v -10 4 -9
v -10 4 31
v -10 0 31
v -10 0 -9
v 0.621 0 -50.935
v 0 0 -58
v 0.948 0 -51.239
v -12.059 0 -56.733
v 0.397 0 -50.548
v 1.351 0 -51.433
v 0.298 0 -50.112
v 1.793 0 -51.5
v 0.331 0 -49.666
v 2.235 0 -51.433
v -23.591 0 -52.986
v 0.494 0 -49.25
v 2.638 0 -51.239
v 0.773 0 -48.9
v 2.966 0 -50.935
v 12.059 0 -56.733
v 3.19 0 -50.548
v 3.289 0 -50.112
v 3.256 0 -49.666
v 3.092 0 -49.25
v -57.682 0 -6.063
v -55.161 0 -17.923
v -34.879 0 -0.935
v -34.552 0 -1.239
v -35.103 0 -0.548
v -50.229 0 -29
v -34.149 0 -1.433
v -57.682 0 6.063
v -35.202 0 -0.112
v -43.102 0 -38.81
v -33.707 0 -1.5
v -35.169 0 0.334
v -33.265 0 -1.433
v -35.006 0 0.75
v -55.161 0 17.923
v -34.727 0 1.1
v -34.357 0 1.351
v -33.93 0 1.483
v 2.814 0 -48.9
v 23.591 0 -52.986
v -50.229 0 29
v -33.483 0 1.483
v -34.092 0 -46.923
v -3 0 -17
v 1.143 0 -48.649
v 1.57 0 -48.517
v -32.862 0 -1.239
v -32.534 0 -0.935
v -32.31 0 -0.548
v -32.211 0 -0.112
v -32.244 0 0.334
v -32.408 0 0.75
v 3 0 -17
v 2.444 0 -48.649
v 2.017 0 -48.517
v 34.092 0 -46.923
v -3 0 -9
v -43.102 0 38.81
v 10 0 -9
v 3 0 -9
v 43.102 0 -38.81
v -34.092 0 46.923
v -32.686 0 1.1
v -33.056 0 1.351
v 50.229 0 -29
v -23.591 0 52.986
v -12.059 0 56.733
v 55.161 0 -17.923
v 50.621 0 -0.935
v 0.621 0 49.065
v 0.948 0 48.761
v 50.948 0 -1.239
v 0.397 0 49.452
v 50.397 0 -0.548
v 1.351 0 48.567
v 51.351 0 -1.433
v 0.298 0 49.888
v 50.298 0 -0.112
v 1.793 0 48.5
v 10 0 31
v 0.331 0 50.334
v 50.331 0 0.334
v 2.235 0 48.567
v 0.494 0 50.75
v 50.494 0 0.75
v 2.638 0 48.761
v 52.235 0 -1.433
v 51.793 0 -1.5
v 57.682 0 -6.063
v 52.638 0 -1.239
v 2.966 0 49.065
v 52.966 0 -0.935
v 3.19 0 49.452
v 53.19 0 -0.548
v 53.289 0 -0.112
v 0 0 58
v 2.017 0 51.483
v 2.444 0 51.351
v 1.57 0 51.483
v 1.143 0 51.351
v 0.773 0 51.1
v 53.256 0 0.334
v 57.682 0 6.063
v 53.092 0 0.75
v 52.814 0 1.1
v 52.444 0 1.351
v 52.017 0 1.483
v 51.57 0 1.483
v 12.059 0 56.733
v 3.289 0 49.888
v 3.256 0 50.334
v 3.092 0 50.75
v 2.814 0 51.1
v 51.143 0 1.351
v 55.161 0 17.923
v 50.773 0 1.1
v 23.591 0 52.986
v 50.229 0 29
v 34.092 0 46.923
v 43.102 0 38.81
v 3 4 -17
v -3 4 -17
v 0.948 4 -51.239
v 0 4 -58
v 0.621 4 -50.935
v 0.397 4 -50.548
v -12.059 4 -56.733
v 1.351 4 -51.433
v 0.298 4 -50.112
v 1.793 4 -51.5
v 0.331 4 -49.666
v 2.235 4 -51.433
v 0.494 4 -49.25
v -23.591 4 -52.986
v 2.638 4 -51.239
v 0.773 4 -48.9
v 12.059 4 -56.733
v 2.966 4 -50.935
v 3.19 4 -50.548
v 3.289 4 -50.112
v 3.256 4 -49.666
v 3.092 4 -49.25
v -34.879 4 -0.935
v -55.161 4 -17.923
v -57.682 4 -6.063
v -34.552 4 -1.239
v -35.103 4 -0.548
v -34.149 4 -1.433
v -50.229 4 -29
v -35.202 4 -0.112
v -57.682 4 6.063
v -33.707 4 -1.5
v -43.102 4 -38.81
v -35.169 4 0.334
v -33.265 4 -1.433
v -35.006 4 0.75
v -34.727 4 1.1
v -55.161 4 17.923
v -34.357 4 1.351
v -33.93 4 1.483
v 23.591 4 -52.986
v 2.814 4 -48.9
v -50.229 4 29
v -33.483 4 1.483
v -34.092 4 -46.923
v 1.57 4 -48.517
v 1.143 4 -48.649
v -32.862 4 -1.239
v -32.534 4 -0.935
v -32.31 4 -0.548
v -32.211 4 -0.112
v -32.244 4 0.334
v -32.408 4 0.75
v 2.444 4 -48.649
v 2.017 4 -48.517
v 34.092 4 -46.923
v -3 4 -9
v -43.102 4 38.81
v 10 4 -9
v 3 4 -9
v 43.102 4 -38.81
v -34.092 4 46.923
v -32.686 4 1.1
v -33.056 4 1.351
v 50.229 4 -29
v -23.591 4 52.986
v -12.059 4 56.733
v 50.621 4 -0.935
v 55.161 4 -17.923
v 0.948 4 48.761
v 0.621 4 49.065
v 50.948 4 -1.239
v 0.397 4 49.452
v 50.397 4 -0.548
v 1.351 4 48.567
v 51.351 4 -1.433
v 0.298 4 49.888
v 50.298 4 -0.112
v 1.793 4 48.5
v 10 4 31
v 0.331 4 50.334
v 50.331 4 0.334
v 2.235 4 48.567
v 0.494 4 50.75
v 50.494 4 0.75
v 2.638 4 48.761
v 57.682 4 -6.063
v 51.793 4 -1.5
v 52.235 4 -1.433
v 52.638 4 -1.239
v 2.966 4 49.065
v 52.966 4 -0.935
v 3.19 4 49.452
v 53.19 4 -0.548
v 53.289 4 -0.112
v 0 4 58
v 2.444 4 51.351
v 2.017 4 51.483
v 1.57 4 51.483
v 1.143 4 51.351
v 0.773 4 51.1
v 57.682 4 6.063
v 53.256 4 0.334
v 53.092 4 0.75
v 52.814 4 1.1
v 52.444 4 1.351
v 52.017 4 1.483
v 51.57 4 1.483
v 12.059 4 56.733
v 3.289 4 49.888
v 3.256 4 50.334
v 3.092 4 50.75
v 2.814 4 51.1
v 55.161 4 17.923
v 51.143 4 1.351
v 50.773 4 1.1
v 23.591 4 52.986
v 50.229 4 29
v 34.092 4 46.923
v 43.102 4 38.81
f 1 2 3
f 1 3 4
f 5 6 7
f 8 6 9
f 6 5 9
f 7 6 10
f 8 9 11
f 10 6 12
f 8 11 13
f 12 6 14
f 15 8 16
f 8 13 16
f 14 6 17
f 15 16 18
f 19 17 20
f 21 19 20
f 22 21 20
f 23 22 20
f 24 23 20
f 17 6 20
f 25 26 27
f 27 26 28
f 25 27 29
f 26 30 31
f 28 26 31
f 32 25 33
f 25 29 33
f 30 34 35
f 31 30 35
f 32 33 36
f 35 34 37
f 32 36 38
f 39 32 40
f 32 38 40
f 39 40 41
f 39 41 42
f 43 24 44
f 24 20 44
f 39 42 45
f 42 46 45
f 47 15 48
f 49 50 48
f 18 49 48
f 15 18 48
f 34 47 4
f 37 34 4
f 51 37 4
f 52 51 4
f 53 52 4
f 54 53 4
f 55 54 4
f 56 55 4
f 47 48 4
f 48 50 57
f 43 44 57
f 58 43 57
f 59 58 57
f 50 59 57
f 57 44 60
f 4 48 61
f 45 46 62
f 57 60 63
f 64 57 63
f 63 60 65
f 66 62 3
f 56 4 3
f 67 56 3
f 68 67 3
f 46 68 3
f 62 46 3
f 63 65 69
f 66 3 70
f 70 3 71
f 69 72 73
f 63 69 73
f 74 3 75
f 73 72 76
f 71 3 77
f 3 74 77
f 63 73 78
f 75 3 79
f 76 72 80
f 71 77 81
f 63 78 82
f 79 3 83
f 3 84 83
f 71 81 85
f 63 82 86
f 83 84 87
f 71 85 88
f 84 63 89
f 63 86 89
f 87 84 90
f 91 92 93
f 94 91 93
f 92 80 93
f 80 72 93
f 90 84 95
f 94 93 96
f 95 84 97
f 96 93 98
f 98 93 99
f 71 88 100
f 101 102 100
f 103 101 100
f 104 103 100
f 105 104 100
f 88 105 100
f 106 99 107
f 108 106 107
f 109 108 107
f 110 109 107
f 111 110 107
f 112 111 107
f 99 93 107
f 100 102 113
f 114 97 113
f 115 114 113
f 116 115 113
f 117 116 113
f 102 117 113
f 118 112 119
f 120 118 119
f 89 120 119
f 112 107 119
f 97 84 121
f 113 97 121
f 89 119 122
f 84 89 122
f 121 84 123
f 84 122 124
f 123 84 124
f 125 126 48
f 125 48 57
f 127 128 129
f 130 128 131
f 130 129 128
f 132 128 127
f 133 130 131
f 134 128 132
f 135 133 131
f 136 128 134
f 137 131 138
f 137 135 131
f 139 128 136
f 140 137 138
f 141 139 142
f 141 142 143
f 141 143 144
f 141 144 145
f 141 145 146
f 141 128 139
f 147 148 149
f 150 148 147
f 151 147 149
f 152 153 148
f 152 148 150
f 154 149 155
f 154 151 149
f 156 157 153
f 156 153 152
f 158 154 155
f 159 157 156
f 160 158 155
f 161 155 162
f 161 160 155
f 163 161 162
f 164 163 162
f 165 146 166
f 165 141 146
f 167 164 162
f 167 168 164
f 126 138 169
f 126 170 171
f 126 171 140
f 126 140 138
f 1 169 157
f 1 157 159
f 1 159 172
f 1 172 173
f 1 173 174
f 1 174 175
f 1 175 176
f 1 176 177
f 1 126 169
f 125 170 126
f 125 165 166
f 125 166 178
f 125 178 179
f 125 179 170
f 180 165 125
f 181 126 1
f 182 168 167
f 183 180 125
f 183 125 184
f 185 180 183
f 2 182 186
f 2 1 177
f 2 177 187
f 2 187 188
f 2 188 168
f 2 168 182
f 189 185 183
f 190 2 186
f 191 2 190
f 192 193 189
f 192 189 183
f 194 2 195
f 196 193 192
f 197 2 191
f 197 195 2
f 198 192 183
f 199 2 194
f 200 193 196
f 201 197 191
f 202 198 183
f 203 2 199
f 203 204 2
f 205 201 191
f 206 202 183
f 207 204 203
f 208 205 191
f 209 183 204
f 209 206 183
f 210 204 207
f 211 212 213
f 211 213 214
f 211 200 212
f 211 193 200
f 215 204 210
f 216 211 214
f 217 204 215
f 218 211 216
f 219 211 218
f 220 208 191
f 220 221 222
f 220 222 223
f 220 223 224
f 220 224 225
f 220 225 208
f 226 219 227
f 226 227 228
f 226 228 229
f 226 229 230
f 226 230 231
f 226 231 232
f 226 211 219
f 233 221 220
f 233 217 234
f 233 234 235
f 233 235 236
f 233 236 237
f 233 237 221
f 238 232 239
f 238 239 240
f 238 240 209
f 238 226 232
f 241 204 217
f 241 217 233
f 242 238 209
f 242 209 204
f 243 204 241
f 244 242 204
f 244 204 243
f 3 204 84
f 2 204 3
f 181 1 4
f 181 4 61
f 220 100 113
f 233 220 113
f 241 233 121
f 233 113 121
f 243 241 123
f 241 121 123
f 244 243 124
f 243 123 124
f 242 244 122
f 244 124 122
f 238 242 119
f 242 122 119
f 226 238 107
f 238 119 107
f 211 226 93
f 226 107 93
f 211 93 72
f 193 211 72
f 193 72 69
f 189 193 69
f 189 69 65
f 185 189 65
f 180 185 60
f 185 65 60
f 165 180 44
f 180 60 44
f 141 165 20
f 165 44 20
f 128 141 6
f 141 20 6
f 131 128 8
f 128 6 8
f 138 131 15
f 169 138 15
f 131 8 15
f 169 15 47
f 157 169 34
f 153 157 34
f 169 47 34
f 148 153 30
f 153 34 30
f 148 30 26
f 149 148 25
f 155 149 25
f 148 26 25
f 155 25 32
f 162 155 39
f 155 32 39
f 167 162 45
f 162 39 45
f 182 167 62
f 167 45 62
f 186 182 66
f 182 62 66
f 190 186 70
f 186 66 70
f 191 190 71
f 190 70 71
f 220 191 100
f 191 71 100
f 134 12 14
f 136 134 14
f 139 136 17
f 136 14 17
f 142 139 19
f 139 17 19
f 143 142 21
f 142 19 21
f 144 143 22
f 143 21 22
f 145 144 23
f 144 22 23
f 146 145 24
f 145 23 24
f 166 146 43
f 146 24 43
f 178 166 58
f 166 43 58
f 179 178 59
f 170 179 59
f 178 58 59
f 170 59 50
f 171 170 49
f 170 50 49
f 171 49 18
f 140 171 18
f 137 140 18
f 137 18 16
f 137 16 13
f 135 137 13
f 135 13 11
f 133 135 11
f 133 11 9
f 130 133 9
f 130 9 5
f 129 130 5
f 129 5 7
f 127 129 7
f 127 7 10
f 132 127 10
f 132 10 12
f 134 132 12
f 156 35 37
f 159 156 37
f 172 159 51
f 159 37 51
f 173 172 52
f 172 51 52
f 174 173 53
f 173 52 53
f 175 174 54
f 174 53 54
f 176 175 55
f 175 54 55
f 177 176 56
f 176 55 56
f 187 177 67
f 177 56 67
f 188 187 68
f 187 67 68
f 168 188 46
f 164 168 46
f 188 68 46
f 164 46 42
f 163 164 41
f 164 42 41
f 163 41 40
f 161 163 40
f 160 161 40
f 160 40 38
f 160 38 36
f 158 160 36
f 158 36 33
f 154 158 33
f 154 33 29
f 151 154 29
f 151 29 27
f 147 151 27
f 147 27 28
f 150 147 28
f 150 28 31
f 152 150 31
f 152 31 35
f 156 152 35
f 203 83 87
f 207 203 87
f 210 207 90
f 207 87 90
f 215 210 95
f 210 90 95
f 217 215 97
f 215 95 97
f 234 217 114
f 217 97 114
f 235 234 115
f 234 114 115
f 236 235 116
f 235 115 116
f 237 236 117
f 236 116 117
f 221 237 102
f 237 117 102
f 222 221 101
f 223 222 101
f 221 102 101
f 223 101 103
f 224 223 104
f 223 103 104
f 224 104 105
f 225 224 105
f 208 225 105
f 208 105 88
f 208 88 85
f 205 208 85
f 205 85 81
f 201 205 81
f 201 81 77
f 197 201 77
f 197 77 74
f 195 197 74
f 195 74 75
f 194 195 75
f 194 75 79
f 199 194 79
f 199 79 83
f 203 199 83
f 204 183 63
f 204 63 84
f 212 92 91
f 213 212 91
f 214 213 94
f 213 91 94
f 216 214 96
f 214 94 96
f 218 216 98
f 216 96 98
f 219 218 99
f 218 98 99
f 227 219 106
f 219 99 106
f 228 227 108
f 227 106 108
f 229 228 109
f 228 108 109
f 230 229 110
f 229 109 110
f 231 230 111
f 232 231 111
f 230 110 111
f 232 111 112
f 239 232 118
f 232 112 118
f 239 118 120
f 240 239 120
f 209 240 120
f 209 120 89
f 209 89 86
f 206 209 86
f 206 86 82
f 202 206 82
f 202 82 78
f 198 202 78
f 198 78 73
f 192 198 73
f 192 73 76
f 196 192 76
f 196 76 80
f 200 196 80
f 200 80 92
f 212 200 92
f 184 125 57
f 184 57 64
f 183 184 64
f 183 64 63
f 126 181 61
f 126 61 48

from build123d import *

# Parameters (mm, degrees)
SKETCH_1_R          = 58
EXTRUDE_1_DEPTH     = 4
SKETCH_3_R          = 1.5
CUT_EXTRUDE_1_DEPTH = 50
CUT_EXTRUDE_2_DEPTH = 500


with BuildPart() as part:
    # 草图1 → 凸台-拉伸1 (new body)
    with BuildSketch(Plane(origin=(0, 0, 0), x_dir=(1, 0, 0), z_dir=(0, 1, 0))):
        with Locations(Location((0, 0, 0), (0, 0, 270))):
            Circle(SKETCH_1_R)
    extrude(amount=EXTRUDE_1_DEPTH)

    # 草图3 → 切除-拉伸1 (cut)
    with BuildSketch(Plane.XZ):
        with Locations(Location((1.793366497, -50, 0), (0, 0, 270))):
            Circle(SKETCH_3_R)
        with Locations(Location((-33.706633503, 0, 0), (0, 0, 270))):
            Circle(SKETCH_3_R)
        with Locations(Location((1.793366497, 50, 0), (0, 0, 270))):
            Circle(SKETCH_3_R)
        with Locations(Location((51.793366497, 0, 0), (0, 0, 270))):
            Circle(SKETCH_3_R)
    extrude(amount=-CUT_EXTRUDE_1_DEPTH, mode=Mode.SUBTRACT)

    # 草图4 → 切除-拉伸2 (cut)
    with BuildSketch(Plane(origin=(0, 4, 0), x_dir=(1, 0, 0), z_dir=(0, 1, 0))):
        Polygon((3, 9), (10, 9), (10, -31), (-10, -31), (-10, 9), (-3, 9), (-3, 17), (3, 17), align=None)
    extrude(amount=-CUT_EXTRUDE_2_DEPTH, mode=Mode.SUBTRACT)


solid = part.part
